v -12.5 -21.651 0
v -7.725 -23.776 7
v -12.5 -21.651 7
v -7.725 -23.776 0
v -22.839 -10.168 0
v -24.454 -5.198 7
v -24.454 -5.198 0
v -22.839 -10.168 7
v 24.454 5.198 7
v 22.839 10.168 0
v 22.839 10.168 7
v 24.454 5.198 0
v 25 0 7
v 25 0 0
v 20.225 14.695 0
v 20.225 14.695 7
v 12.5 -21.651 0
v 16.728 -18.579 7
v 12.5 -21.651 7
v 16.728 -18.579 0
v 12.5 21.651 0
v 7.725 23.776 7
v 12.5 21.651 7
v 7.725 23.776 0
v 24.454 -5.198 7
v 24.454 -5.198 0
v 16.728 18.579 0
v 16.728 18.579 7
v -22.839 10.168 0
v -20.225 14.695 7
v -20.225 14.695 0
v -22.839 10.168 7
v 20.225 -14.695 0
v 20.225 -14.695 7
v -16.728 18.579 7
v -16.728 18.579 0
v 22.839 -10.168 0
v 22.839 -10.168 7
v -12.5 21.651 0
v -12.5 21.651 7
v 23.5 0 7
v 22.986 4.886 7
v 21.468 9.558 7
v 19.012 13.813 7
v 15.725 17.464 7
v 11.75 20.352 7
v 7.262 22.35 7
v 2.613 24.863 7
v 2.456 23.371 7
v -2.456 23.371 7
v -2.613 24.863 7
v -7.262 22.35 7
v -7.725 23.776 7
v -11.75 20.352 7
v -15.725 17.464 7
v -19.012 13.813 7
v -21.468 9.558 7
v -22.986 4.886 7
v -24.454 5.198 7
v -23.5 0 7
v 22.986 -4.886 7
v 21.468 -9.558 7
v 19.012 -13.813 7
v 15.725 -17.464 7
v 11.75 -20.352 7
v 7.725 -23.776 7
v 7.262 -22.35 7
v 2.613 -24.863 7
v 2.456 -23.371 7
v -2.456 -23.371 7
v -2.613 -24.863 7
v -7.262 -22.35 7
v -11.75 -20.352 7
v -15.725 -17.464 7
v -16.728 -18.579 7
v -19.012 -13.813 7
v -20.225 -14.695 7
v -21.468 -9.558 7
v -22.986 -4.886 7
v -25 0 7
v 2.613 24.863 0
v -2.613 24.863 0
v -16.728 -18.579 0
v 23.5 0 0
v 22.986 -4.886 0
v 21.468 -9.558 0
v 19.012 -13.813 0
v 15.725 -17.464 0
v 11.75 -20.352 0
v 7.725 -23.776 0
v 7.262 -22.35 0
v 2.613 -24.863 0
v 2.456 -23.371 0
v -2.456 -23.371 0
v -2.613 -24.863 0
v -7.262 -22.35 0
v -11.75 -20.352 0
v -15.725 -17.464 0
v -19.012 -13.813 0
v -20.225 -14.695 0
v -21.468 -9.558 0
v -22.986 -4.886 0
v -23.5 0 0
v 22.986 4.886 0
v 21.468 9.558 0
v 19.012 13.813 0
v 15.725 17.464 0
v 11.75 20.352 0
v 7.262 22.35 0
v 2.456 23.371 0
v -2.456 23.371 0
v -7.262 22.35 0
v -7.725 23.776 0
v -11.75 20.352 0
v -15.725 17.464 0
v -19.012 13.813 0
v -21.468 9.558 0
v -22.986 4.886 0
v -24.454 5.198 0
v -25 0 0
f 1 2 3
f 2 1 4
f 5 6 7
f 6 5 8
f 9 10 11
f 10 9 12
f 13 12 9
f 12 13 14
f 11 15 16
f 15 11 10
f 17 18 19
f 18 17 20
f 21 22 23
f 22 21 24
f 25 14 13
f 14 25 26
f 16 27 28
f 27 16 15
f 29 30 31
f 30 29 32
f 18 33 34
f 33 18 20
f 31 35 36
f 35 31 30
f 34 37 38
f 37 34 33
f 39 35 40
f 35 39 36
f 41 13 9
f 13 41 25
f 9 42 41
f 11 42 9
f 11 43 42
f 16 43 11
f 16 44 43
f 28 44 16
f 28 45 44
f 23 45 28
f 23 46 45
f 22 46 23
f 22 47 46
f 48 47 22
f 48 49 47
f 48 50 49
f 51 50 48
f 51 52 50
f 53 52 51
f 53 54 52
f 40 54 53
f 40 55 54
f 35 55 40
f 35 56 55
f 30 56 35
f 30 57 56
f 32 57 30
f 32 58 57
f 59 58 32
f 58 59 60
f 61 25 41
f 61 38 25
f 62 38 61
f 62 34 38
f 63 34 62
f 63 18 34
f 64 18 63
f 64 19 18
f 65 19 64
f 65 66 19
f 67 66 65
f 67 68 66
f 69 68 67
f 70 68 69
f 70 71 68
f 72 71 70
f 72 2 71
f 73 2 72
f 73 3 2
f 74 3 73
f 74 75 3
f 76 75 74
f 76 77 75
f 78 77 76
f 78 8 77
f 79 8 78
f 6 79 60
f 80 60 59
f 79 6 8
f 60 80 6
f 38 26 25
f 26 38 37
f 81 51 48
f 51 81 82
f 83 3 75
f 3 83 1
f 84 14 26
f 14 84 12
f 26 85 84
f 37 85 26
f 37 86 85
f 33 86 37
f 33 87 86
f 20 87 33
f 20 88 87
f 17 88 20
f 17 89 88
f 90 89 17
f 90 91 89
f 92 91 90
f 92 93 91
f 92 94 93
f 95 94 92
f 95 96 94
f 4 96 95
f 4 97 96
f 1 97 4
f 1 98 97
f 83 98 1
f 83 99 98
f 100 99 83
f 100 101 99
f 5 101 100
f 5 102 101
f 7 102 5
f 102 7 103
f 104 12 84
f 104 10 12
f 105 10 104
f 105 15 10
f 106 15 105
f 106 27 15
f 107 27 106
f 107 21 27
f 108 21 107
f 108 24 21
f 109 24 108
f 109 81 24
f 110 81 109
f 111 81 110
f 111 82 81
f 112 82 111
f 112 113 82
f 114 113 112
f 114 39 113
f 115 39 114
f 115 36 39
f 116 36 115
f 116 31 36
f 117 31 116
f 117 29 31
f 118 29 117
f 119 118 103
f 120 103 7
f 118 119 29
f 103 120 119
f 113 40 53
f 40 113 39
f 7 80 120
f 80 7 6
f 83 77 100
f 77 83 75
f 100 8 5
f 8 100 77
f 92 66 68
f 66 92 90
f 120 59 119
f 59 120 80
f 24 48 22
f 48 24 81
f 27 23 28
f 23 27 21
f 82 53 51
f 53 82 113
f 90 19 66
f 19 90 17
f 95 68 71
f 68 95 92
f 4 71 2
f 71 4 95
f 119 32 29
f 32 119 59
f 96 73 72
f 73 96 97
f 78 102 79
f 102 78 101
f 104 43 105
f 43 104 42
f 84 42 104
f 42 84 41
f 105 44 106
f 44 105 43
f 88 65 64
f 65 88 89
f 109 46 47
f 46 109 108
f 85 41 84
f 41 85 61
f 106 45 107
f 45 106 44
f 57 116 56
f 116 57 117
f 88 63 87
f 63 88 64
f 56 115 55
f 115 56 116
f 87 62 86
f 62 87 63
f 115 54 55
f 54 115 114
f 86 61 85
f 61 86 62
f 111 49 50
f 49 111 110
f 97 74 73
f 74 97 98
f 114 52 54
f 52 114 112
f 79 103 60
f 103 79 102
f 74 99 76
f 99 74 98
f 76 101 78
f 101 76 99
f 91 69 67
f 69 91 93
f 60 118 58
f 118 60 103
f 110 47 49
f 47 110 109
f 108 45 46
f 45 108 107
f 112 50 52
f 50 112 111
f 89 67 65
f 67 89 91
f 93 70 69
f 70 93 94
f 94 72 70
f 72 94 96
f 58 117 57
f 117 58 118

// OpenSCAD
width           = 7;
wheel_diameter  = 50;
wheel_thickness = 3;

difference(){
    cylinder(width,
             d1=wheel_diameter,
             d2=wheel_diameter);
    cylinder(width, d1=wheel_diameter -
                       wheel_thickness,
                    d2=wheel_diameter -
                       wheel_thickness);
}
